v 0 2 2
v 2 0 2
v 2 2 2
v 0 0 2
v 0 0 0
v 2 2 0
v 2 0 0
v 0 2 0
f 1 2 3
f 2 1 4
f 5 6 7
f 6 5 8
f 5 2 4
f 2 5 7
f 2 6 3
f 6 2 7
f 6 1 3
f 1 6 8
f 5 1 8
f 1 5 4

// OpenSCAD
$fn=7;
translate([0,0,0])
{
	rotate(0,[0,0,1])
	{
		cube([2,2,2]);
	}
}
